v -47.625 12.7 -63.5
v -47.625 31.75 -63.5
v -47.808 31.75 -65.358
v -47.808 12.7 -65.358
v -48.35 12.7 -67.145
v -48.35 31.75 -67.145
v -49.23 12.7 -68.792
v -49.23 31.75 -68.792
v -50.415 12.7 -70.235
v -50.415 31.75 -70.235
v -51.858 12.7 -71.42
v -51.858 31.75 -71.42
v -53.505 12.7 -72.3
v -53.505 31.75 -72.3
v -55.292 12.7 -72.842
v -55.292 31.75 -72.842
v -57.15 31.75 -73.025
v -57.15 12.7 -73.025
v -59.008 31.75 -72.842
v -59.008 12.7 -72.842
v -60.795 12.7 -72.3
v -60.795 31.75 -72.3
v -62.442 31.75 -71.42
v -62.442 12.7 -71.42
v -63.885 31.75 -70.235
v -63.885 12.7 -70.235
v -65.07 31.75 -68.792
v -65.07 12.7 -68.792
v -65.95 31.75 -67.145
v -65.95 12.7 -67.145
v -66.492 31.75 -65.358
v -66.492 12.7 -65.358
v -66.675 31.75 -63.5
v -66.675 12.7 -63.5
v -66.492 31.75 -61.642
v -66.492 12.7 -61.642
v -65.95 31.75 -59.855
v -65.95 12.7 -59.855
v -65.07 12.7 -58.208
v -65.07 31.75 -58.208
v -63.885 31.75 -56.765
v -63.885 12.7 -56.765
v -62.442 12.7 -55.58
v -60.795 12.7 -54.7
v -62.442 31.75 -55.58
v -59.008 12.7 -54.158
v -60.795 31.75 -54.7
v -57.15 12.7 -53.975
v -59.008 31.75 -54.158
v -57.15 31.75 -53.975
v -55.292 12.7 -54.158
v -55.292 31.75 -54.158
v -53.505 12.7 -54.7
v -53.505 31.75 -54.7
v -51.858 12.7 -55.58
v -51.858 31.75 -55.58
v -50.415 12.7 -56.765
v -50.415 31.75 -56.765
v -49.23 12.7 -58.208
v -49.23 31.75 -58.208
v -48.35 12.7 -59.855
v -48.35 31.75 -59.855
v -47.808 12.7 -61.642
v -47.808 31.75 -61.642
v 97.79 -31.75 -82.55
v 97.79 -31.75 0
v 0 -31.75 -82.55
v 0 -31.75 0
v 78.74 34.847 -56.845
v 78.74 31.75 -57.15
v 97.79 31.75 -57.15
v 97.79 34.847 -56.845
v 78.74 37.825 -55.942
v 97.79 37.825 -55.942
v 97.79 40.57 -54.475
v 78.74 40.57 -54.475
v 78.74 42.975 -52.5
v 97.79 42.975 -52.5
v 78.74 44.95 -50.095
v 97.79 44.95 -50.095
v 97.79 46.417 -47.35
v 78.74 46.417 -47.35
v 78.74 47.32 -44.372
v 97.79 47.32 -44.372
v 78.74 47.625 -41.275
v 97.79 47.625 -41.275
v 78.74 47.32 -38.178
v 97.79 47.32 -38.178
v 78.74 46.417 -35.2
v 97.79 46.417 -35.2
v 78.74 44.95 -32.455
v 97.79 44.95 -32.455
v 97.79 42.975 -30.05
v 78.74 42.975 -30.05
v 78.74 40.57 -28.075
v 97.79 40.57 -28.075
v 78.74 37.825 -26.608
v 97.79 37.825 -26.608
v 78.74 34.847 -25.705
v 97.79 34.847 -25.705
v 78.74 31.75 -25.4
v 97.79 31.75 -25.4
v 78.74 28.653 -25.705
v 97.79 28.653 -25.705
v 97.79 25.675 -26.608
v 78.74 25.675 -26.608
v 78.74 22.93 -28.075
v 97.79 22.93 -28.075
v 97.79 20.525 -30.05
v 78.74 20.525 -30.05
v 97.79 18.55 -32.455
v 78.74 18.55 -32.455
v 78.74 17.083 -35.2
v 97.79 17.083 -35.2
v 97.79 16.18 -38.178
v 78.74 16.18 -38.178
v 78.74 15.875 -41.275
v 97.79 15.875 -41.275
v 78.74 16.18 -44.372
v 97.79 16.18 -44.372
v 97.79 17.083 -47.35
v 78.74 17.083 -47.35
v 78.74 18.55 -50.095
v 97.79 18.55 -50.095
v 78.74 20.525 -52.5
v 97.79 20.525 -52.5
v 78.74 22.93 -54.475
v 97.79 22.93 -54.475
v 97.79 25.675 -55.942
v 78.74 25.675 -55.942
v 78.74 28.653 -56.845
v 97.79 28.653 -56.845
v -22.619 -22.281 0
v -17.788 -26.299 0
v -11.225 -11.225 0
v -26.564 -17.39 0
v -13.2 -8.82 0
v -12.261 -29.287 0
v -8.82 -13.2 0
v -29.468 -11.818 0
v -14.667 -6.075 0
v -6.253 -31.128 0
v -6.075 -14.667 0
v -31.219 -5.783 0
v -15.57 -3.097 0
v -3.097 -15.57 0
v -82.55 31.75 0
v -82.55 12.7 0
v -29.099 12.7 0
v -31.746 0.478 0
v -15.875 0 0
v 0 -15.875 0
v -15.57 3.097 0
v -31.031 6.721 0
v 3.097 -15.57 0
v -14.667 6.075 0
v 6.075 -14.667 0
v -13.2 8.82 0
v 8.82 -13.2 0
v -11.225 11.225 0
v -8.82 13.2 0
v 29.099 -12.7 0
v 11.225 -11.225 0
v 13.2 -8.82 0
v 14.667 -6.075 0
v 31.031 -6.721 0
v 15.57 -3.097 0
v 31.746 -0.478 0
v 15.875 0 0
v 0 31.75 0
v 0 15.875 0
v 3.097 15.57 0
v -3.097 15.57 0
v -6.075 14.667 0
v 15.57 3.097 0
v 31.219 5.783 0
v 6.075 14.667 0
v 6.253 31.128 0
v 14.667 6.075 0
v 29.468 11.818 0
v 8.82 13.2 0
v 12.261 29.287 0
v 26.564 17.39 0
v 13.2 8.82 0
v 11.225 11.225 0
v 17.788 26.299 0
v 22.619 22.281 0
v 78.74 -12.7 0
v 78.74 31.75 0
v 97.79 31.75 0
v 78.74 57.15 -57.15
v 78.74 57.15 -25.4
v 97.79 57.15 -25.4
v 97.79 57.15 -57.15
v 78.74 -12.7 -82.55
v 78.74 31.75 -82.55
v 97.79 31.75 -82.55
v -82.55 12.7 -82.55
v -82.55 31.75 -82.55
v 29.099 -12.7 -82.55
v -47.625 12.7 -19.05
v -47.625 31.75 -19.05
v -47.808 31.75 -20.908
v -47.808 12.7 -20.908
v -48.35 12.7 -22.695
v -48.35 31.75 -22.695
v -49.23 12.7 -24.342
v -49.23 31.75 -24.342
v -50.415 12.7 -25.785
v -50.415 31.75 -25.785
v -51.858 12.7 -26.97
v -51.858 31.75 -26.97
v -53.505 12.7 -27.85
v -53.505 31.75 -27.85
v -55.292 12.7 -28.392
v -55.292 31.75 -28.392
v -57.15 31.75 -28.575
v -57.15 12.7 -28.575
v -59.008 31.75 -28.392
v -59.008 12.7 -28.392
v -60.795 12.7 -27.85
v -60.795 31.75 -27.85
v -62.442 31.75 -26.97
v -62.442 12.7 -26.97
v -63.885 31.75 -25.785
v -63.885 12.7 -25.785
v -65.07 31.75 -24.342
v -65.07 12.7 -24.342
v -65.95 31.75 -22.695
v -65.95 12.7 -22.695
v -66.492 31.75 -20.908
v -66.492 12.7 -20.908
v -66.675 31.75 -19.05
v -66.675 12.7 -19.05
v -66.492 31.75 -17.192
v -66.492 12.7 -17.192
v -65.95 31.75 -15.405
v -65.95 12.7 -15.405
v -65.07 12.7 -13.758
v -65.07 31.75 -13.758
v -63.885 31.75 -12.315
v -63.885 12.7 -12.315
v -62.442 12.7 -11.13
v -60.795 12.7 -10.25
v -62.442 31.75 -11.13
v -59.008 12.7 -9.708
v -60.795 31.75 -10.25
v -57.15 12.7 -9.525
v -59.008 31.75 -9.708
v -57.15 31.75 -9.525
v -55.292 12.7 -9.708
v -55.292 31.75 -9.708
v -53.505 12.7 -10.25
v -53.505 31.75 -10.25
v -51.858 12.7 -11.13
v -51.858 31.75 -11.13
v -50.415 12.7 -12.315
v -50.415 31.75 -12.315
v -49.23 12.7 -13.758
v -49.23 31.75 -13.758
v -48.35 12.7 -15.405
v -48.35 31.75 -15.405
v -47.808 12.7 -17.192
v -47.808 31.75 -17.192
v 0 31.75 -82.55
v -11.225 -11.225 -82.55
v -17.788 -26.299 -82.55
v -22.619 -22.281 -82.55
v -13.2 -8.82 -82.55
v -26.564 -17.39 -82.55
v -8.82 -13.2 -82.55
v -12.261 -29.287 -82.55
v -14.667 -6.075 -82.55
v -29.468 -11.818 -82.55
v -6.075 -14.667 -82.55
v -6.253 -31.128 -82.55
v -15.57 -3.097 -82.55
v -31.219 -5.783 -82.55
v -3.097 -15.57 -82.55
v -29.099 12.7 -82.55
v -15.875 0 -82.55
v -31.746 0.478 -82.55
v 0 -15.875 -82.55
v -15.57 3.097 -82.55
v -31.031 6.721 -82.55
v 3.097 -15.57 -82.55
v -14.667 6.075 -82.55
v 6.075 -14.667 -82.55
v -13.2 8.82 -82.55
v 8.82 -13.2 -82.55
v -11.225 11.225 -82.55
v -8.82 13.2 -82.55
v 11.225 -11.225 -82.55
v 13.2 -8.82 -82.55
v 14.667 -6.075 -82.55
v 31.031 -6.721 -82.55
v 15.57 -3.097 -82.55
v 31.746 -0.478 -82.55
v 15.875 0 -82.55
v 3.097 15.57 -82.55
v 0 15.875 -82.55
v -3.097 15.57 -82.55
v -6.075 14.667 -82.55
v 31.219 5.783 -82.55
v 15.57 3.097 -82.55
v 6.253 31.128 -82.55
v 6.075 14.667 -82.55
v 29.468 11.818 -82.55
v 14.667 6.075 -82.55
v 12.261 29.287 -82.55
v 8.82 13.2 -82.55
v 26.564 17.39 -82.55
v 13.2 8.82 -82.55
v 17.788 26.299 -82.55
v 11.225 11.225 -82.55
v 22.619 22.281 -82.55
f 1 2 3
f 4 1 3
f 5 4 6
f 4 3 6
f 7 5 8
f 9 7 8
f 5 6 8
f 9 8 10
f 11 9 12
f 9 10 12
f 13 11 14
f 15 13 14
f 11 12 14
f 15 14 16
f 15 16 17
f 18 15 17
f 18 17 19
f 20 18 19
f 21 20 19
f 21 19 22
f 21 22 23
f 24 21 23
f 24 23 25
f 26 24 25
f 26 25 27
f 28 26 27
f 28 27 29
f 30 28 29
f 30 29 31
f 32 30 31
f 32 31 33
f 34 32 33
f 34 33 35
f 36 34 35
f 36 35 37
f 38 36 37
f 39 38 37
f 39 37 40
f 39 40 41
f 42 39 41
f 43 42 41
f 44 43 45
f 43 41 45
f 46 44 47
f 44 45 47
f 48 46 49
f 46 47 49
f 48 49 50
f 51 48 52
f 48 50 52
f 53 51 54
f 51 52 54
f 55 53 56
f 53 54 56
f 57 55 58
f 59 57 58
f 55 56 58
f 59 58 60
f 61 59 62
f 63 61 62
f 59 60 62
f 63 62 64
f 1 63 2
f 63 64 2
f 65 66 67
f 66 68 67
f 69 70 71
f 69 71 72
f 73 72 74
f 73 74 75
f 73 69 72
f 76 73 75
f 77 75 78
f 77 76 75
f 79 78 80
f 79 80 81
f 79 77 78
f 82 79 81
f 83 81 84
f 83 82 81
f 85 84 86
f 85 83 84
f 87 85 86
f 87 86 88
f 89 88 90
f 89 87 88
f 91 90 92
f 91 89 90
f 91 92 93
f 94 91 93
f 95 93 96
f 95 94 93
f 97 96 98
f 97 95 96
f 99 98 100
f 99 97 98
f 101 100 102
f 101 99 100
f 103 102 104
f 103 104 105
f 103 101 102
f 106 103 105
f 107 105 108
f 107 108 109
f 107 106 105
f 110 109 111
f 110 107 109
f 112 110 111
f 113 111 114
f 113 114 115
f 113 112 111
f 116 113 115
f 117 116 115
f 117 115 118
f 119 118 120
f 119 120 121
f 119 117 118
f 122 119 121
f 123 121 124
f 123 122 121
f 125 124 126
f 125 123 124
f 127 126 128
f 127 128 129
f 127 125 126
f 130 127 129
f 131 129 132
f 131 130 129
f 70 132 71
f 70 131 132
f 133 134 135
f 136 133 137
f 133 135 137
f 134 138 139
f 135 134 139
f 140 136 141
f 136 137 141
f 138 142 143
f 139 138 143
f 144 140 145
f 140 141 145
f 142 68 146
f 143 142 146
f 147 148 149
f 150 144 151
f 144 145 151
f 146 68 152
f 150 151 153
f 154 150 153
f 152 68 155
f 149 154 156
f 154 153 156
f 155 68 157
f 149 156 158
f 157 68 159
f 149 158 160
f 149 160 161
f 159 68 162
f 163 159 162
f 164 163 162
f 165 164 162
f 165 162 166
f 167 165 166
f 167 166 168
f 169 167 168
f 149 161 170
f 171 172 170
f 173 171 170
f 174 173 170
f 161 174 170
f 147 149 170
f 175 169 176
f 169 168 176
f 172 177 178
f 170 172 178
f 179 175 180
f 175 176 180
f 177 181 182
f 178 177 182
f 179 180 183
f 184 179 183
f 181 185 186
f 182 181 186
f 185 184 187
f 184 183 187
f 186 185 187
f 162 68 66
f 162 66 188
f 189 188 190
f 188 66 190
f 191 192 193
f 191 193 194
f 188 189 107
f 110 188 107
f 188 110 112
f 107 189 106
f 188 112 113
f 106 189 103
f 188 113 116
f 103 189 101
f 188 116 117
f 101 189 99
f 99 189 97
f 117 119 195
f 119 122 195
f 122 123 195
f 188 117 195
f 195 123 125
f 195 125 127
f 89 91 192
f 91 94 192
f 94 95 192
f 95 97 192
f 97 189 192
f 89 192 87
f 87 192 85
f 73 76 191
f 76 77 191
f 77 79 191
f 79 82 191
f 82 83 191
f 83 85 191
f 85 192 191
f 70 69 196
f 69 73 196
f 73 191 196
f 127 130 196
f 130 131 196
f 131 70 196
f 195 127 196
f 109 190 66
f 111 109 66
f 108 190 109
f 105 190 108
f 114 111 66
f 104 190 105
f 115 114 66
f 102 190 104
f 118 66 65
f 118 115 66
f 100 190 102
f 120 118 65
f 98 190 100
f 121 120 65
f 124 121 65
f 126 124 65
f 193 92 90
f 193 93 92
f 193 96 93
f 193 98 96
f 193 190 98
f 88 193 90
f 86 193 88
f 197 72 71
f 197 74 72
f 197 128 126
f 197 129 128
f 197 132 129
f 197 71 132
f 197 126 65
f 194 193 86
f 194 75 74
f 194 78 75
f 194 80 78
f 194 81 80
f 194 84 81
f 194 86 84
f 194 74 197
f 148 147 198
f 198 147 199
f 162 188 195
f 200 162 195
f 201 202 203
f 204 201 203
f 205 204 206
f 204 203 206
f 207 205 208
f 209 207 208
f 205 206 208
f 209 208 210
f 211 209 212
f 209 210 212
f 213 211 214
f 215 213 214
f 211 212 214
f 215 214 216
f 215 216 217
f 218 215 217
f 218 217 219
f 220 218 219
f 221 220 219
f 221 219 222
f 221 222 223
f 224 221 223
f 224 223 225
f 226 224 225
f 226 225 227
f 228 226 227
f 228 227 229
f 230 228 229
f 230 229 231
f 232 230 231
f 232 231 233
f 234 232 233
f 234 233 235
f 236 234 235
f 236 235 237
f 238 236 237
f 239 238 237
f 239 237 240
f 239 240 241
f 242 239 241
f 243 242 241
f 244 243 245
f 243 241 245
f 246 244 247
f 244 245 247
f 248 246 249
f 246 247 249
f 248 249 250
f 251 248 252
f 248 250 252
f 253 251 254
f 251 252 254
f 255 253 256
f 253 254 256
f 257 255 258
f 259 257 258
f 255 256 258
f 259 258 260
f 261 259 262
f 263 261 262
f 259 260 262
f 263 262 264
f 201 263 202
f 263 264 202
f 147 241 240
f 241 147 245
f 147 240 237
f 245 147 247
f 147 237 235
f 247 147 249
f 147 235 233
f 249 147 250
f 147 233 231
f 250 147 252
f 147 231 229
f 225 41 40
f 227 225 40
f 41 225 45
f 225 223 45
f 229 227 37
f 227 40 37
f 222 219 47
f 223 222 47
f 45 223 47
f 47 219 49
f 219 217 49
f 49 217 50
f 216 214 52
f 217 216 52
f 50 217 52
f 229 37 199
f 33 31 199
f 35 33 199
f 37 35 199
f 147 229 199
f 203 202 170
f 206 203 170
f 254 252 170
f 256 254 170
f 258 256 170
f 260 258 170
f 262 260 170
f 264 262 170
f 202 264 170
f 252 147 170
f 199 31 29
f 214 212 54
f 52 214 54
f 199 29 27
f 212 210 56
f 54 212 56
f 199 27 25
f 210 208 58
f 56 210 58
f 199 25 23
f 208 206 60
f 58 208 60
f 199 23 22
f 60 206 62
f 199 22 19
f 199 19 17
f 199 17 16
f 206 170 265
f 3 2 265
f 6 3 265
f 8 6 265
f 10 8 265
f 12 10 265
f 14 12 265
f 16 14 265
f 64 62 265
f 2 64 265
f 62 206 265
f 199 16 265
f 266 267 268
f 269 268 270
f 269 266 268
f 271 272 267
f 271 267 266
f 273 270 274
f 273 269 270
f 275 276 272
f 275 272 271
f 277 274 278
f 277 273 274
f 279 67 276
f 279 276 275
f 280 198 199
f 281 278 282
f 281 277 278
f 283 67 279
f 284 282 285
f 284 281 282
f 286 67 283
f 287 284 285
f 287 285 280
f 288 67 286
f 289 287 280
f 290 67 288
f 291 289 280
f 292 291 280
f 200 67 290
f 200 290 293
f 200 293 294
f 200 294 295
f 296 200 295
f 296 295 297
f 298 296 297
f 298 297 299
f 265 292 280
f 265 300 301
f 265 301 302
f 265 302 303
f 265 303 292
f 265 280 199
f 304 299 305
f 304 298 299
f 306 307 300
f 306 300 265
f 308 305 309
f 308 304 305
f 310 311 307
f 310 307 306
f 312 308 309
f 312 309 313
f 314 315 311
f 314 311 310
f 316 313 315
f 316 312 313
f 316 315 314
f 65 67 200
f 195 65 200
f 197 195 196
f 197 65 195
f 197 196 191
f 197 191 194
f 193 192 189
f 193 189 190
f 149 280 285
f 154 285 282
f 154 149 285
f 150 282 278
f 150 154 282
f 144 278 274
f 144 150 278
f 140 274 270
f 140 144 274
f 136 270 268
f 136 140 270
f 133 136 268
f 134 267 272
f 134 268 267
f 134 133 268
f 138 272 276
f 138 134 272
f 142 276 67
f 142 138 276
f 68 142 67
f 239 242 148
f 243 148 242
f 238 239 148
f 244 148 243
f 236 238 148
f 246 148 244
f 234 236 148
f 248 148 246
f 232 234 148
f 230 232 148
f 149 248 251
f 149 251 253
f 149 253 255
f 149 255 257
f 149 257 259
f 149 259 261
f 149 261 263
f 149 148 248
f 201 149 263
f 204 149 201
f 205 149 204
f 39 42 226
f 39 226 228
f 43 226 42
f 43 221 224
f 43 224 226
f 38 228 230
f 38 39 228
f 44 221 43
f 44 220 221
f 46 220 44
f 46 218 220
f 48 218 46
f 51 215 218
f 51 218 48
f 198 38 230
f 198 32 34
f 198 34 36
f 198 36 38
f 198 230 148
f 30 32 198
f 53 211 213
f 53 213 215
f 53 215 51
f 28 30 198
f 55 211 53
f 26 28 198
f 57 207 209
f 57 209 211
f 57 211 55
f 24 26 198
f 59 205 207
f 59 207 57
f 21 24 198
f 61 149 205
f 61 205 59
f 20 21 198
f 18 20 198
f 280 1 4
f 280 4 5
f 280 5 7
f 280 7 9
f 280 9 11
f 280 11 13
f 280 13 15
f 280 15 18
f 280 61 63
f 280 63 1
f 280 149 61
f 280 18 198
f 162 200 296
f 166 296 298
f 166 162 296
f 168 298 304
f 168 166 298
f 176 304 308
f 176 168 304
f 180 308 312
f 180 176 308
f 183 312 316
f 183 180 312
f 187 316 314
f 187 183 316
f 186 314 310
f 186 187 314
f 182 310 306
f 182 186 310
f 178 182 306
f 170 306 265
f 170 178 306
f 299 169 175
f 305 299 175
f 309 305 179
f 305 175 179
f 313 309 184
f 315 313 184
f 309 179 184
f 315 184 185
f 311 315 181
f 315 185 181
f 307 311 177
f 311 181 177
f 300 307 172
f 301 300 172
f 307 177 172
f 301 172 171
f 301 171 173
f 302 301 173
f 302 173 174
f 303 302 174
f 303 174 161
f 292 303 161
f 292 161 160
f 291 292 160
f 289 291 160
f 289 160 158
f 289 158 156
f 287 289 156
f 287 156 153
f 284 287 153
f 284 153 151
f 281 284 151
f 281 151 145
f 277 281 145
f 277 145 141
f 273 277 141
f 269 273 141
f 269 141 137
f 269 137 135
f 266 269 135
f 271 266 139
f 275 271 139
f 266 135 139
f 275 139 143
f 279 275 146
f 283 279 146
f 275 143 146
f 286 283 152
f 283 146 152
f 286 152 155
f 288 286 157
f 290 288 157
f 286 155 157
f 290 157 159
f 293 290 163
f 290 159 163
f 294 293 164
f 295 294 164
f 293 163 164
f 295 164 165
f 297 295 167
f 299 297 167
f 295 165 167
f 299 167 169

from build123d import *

# Parameters (mm, degrees)
SKETCH1_R                = 31.75
BOSS_EXTRUDE1_DEPTH      = 82.55
SKETCH4_W                = 82.55
SKETCH4_H                = 19.05
BOSS_EXTRUDE2_DEPTH      = 46.99
BOSS_EXTRUDE2_DEPTH_BACK = 31.75
SKETCH5_W                = 82.55
SKETCH5_H                = 88.9
SKETCH5_R                = 15.875
BOSS_EXTRUDE3_DEPTH      = 19.05
CHAMFER1_SIZE            = 25.4
SKETCH8_W                = 82.55
SKETCH8_H                = 19.05
BOSS_EXTRUDE4_DEPTH      = 31.75
BOSS_EXTRUDE4_DEPTH_BACK = 50.8
SKETCH3_R                = 15.875
CUT_EXTRUDE2_DEPTH       = 163.576
SKETCH9_R                = 9.525
CUT_EXTRUDE3_DEPTH       = 163.576


with BuildPart() as part:
    # Sketch1 → Boss-Extrude1 (new body)
    with BuildSketch(Plane.XY):
        Circle(SKETCH1_R)
    extrude(amount=-BOSS_EXTRUDE1_DEPTH)

    # Sketch4 → Boss-Extrude2 (add, two sides)
    with BuildSketch(Plane(origin=(31.75, 0, 0), x_dir=(0, 0, -1), z_dir=(1, 0, 0))) as boss_extrude2_sk:
        with Locations((41.275, -22.225)):
            Rectangle(SKETCH4_W, SKETCH4_H)
    extrude(amount=BOSS_EXTRUDE2_DEPTH)
    extrude(boss_extrude2_sk.sketch, amount=-BOSS_EXTRUDE2_DEPTH_BACK)

    # Sketch5 → Boss-Extrude3 (add)
    with BuildSketch(Plane(origin=(78.74, 0, 0), x_dir=(0, 0, -1), z_dir=(1, 0, 0))):
        with Locations((41.275, 12.7)):
            Rectangle(SKETCH5_W, SKETCH5_H)
        with Locations((41.275, 31.75)):
            Circle(SKETCH5_R, mode=Mode.SUBTRACT)
    extrude(amount=BOSS_EXTRUDE3_DEPTH)

    # Chamfer1
    chamfer1_edges = [part.edges().sort_by_distance(p)[0] for p in [
        (88.265, 57.15, -82.55),
        (88.265, 57.15, 0),
    ]]
    chamfer(chamfer1_edges, length=CHAMFER1_SIZE)

    # Sketch8 → Boss-Extrude4 (add, two sides)
    with BuildSketch(Plane(origin=(-31.75, 0, 0), x_dir=(0, 0, -1), z_dir=(1, 0, 0))) as boss_extrude4_sk:
        with Locations((41.275, 22.225)):
            Rectangle(SKETCH8_W, SKETCH8_H)
    extrude(amount=BOSS_EXTRUDE4_DEPTH)
    extrude(boss_extrude4_sk.sketch, amount=-BOSS_EXTRUDE4_DEPTH_BACK)

    # Sketch3 → Cut-Extrude2 (cut)
    with BuildSketch(Plane.XY):
        Circle(SKETCH3_R)
    extrude(amount=-CUT_EXTRUDE2_DEPTH, mode=Mode.SUBTRACT)

    # Sketch9 → Cut-Extrude3 (cut)
    with BuildSketch(Plane(origin=(0, 31.75, 0), x_dir=(1, 0, 0), z_dir=(0, 1, 0))):
        with Locations((-57.15, 63.5)):
            Circle(SKETCH9_R)
        with Locations((-57.15, 19.05)):
            Circle(SKETCH9_R)
    extrude(amount=-CUT_EXTRUDE3_DEPTH, mode=Mode.SUBTRACT)


solid = part.part
